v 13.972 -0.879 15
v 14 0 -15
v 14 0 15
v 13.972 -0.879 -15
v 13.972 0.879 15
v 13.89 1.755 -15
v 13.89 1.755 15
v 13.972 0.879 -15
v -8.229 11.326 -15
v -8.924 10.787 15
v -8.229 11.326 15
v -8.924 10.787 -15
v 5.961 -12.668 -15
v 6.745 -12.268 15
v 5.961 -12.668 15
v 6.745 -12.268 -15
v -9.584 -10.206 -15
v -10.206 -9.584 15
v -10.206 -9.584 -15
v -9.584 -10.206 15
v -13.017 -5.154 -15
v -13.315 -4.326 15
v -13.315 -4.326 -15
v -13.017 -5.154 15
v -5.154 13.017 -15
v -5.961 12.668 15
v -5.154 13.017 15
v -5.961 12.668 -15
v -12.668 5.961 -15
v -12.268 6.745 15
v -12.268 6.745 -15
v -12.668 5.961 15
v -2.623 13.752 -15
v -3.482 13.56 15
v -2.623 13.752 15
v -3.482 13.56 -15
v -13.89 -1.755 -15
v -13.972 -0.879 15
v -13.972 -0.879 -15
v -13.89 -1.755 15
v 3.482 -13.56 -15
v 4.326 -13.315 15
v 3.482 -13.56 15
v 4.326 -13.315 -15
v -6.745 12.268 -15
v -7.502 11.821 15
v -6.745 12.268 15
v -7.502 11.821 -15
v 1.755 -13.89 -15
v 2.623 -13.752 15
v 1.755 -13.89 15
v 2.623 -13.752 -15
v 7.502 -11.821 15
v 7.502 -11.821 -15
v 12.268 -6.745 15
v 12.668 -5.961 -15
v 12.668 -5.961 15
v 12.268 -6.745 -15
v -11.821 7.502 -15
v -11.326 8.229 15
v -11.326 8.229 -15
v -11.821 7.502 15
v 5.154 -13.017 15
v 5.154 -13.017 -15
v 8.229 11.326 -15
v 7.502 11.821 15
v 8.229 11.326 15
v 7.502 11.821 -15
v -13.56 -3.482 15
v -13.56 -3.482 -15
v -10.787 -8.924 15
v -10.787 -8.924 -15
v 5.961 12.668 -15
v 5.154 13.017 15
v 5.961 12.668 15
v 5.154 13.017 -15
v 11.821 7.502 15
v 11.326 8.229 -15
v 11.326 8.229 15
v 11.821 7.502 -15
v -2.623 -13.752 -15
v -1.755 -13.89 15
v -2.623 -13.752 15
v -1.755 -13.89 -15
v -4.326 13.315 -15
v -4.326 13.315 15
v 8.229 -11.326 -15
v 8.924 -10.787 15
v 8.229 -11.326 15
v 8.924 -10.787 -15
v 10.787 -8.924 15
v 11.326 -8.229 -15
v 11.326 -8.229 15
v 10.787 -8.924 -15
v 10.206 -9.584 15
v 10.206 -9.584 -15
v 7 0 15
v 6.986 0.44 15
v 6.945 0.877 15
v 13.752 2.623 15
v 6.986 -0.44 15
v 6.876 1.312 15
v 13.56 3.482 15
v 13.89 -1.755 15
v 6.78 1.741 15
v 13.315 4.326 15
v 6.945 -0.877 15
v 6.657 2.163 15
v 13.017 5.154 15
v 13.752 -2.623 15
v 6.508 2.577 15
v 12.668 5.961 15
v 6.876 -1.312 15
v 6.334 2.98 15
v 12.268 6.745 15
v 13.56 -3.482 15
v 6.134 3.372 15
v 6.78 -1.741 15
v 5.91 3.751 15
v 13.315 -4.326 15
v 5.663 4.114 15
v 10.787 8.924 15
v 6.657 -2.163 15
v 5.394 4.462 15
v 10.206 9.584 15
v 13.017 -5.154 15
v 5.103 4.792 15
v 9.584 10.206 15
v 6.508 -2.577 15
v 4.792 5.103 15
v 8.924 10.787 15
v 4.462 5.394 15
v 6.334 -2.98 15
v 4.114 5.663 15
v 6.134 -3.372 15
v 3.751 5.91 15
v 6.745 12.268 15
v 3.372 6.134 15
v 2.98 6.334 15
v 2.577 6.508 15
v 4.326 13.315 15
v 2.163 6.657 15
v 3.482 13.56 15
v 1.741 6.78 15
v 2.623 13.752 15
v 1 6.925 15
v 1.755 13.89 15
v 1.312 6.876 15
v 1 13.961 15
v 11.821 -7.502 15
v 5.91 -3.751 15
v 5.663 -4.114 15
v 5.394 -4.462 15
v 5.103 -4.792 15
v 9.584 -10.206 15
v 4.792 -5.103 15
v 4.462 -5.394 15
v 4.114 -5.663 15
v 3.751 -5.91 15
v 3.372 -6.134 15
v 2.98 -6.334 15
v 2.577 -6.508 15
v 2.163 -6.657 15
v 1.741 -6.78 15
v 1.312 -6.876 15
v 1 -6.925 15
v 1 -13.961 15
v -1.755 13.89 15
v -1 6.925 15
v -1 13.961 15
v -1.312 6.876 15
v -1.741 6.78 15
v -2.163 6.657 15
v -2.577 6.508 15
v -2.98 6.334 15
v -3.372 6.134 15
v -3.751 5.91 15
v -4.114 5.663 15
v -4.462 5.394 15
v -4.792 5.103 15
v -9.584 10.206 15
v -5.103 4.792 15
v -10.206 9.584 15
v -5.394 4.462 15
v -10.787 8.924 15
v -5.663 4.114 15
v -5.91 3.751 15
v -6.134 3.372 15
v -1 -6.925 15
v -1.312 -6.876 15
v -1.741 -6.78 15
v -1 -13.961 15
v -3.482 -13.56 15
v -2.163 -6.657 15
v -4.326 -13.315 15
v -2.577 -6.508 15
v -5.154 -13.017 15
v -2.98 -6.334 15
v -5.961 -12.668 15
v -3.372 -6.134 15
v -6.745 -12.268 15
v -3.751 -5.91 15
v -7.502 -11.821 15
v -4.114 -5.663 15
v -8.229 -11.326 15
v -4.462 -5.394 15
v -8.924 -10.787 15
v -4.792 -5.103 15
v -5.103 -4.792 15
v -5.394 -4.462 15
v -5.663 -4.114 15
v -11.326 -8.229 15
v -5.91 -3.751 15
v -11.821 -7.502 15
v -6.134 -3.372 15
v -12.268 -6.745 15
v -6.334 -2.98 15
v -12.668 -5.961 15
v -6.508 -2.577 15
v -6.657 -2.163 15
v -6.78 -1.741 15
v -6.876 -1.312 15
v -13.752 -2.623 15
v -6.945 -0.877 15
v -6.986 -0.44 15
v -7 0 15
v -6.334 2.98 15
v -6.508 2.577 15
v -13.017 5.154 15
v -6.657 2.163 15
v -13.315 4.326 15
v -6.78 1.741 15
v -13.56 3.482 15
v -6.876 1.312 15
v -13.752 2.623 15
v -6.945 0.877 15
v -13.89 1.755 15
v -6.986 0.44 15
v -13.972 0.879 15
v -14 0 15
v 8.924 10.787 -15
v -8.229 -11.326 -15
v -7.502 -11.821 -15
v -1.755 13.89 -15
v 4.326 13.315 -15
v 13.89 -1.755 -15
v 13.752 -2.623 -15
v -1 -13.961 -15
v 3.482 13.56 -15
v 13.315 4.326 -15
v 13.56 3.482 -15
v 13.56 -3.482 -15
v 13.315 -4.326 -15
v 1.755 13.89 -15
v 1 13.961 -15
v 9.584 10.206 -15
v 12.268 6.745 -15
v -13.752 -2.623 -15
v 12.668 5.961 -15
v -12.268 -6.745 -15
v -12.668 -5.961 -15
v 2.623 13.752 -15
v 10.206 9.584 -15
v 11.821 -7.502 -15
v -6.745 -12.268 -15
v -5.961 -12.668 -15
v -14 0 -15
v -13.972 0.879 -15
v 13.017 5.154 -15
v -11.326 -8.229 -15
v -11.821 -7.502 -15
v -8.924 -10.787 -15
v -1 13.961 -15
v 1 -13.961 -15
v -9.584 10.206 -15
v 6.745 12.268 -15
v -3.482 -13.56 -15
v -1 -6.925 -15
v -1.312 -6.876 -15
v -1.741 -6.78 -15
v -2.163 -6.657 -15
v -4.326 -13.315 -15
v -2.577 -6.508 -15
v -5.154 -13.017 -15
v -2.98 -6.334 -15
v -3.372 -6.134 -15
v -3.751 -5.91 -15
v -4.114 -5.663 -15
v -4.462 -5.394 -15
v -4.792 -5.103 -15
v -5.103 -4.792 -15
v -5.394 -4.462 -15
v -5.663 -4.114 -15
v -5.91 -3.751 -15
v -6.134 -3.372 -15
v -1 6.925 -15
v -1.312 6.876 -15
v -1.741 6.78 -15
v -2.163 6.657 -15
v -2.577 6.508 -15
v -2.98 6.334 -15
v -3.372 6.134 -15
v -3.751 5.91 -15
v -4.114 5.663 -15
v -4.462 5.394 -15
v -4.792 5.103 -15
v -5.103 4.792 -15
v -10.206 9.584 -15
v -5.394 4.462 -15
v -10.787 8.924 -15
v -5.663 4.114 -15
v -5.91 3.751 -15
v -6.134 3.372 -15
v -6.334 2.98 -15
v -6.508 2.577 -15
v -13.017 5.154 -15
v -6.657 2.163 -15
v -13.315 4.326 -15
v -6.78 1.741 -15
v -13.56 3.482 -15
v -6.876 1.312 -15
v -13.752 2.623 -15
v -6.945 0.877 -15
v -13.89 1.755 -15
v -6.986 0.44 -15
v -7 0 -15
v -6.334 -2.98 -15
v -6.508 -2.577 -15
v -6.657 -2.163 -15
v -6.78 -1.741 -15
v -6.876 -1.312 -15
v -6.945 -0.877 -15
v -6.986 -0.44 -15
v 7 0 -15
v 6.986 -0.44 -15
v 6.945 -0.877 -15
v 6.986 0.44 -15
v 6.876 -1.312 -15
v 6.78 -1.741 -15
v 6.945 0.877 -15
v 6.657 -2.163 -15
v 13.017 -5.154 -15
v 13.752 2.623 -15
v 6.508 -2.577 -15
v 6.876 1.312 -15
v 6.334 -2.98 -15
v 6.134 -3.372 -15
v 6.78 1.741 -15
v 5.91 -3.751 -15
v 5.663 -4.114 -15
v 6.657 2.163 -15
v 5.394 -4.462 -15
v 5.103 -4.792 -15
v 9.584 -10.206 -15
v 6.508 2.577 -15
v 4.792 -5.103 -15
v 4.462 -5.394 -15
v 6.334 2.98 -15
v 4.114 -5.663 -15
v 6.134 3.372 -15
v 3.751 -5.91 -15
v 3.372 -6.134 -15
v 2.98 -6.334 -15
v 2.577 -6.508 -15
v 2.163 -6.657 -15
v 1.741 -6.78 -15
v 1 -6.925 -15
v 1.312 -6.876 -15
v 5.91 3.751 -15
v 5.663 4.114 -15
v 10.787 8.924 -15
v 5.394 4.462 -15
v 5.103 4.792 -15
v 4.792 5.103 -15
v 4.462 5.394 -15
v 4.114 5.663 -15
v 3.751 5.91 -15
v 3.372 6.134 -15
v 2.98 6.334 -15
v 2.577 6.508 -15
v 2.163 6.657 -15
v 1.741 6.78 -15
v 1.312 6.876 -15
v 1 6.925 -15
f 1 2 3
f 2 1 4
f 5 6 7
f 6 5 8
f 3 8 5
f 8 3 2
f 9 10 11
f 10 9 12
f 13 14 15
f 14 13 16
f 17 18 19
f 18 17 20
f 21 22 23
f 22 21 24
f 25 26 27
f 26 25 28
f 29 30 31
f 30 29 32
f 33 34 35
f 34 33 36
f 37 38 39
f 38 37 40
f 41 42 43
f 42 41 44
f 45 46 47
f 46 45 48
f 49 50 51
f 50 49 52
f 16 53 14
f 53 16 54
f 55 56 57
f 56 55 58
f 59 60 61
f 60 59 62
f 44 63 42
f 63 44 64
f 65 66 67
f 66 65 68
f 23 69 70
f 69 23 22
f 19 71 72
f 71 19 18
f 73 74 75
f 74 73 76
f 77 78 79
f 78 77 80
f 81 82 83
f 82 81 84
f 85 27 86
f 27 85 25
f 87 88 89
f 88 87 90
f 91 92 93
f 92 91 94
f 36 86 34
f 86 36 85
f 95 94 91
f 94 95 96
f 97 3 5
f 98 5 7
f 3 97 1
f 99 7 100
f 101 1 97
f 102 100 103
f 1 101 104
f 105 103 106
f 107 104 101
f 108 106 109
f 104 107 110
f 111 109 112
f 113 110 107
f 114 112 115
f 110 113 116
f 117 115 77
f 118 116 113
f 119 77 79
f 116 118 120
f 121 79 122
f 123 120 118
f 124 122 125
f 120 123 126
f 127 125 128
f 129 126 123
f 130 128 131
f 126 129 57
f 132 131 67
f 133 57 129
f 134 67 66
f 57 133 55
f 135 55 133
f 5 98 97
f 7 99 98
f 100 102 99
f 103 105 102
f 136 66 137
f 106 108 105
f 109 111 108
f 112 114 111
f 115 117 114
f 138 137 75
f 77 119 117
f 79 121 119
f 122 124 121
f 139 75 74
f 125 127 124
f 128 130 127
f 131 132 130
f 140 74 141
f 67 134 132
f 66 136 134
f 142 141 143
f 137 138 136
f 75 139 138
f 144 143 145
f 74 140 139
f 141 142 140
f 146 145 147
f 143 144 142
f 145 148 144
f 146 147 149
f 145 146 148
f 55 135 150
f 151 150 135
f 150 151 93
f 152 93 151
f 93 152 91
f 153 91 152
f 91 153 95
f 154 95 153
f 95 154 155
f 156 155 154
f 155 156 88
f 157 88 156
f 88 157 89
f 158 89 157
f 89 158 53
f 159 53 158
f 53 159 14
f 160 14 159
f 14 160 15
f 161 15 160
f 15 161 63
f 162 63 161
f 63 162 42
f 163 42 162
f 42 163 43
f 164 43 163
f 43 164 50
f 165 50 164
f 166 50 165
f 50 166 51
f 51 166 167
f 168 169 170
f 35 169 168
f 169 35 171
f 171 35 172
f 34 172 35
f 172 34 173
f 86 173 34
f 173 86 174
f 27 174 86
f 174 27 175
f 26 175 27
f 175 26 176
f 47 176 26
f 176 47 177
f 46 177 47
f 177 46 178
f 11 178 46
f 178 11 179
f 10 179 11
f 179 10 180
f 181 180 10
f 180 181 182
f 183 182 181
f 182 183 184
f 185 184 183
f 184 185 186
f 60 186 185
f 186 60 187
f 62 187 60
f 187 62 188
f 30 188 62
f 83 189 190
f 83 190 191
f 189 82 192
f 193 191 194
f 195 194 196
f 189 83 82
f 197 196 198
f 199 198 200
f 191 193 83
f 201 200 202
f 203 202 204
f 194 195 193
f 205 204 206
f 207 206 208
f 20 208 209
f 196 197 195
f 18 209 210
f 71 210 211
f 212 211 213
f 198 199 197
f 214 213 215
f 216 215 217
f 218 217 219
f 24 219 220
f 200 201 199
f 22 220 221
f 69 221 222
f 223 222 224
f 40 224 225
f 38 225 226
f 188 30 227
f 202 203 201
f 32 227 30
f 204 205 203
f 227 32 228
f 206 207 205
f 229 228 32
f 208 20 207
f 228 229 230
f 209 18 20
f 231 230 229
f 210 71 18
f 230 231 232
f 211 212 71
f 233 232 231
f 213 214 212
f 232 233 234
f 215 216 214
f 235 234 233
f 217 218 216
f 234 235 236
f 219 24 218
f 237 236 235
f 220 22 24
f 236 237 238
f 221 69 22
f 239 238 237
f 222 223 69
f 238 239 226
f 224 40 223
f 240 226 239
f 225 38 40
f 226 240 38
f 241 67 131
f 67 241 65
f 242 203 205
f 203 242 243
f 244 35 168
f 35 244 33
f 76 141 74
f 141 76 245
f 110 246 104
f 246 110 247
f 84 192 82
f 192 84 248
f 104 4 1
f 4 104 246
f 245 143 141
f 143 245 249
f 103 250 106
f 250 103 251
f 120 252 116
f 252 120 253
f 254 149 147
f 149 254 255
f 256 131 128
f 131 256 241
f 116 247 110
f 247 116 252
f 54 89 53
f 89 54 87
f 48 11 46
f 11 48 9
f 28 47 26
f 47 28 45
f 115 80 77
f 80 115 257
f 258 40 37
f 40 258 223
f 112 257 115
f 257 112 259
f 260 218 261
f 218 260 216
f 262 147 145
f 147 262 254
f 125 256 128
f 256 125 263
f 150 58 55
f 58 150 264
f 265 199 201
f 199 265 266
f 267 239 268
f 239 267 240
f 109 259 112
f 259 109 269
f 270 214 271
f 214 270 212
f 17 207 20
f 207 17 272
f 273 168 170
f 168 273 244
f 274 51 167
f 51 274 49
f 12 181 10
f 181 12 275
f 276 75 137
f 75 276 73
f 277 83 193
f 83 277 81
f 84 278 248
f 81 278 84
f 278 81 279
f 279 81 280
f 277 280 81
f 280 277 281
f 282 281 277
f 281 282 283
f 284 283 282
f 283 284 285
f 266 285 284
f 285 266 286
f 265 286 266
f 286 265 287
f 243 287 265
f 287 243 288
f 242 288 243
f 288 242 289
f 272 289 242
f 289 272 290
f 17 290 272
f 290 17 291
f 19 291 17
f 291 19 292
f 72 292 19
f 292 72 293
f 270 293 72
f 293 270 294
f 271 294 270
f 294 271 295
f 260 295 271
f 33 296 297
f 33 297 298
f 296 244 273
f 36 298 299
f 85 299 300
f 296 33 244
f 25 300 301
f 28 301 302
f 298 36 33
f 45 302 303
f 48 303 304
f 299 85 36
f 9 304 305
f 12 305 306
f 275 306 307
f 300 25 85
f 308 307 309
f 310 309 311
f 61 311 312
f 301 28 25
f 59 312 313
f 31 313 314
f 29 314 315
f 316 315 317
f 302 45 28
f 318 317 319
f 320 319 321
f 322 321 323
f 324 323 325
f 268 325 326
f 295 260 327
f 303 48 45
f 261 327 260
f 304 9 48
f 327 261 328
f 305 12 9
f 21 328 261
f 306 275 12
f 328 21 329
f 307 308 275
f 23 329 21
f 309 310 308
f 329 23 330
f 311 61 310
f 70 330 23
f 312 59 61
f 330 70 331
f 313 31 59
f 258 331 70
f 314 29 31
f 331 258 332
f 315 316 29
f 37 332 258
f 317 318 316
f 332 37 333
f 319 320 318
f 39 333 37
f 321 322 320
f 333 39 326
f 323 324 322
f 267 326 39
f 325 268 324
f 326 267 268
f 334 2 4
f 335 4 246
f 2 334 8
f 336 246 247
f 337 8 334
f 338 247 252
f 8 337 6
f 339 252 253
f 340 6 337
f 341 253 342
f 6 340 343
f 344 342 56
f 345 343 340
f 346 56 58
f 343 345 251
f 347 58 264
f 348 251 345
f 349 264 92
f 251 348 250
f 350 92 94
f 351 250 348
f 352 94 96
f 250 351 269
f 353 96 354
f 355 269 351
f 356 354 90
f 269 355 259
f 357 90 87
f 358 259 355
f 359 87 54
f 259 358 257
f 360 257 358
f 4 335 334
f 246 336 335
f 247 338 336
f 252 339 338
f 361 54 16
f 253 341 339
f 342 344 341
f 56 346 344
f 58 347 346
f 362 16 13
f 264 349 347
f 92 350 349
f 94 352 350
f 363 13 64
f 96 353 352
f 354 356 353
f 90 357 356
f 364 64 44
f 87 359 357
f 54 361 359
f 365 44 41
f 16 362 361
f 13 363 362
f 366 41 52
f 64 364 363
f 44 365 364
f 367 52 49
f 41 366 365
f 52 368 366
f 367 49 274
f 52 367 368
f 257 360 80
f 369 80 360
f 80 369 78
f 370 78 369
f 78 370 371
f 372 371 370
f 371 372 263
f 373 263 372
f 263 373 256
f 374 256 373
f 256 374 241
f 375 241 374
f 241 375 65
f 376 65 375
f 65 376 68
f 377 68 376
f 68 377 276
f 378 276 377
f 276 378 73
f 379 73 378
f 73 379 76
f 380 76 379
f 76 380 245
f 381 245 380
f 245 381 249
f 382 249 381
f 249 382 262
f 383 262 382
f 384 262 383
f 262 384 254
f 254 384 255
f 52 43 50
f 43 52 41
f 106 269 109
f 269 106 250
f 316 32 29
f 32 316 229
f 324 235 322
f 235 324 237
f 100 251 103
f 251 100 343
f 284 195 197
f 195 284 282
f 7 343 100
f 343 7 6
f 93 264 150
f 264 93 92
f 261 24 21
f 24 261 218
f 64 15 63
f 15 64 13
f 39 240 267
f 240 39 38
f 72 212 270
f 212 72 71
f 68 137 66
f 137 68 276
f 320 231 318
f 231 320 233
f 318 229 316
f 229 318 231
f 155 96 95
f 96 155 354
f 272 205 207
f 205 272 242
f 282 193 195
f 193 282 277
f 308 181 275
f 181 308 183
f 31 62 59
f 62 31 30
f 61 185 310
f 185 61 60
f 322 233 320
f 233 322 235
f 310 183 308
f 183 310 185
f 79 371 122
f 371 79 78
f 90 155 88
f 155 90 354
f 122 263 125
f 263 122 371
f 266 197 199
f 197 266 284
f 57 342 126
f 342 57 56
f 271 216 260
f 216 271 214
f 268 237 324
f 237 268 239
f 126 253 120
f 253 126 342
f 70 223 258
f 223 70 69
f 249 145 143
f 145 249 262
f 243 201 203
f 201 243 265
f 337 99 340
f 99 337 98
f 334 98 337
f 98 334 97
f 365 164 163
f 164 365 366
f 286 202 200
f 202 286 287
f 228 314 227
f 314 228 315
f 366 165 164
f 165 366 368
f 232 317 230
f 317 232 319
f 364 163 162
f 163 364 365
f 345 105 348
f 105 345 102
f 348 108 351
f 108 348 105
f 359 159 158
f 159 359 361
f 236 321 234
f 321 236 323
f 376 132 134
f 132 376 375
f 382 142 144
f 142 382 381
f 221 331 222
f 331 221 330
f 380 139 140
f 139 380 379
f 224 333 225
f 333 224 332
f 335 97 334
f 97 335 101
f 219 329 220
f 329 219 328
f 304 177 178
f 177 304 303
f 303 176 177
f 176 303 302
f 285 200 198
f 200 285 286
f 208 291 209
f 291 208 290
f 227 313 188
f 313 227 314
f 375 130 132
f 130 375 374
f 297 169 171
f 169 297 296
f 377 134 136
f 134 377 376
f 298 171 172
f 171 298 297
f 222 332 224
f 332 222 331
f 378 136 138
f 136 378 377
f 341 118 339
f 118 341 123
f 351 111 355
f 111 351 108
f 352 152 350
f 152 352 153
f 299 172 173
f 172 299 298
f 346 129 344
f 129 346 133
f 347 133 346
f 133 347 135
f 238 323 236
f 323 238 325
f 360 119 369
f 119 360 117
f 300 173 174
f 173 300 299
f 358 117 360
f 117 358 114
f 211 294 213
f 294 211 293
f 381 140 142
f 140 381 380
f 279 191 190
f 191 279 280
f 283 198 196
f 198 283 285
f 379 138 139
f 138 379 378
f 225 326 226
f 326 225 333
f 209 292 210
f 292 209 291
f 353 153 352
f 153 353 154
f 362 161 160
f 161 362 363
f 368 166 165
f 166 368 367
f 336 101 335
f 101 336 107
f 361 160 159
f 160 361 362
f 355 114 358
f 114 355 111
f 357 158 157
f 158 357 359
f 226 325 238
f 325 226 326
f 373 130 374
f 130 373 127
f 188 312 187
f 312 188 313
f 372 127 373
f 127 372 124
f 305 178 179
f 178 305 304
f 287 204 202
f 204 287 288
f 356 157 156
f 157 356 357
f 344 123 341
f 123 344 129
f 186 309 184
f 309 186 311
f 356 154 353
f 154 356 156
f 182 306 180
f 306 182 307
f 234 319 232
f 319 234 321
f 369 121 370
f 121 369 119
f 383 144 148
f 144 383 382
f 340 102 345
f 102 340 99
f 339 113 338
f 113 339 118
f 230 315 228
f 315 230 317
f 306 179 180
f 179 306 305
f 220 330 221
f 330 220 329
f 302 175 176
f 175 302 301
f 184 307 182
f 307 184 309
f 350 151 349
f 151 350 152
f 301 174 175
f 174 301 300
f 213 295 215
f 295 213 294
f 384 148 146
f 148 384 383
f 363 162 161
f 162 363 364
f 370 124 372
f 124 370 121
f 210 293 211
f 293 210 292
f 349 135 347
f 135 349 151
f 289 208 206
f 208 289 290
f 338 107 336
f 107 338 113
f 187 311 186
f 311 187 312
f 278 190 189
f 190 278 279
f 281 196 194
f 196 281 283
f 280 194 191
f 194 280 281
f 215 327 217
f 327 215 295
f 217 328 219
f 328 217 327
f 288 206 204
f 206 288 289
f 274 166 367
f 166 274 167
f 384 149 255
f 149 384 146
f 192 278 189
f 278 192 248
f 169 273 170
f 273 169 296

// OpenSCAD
$fn=100;

module mezikruzi(h_in, d1_in, d2_in){
    difference(){
        cylinder(h=h_in, d=d2_in, center=true);
        cylinder(h=h_in, d=d1_in, center=true);
        }//diff
    }//module
    
difference(){
    mezikruzi(30,14,28);
    color("Red") cube([2,30,30],center=true);
    }//difference
